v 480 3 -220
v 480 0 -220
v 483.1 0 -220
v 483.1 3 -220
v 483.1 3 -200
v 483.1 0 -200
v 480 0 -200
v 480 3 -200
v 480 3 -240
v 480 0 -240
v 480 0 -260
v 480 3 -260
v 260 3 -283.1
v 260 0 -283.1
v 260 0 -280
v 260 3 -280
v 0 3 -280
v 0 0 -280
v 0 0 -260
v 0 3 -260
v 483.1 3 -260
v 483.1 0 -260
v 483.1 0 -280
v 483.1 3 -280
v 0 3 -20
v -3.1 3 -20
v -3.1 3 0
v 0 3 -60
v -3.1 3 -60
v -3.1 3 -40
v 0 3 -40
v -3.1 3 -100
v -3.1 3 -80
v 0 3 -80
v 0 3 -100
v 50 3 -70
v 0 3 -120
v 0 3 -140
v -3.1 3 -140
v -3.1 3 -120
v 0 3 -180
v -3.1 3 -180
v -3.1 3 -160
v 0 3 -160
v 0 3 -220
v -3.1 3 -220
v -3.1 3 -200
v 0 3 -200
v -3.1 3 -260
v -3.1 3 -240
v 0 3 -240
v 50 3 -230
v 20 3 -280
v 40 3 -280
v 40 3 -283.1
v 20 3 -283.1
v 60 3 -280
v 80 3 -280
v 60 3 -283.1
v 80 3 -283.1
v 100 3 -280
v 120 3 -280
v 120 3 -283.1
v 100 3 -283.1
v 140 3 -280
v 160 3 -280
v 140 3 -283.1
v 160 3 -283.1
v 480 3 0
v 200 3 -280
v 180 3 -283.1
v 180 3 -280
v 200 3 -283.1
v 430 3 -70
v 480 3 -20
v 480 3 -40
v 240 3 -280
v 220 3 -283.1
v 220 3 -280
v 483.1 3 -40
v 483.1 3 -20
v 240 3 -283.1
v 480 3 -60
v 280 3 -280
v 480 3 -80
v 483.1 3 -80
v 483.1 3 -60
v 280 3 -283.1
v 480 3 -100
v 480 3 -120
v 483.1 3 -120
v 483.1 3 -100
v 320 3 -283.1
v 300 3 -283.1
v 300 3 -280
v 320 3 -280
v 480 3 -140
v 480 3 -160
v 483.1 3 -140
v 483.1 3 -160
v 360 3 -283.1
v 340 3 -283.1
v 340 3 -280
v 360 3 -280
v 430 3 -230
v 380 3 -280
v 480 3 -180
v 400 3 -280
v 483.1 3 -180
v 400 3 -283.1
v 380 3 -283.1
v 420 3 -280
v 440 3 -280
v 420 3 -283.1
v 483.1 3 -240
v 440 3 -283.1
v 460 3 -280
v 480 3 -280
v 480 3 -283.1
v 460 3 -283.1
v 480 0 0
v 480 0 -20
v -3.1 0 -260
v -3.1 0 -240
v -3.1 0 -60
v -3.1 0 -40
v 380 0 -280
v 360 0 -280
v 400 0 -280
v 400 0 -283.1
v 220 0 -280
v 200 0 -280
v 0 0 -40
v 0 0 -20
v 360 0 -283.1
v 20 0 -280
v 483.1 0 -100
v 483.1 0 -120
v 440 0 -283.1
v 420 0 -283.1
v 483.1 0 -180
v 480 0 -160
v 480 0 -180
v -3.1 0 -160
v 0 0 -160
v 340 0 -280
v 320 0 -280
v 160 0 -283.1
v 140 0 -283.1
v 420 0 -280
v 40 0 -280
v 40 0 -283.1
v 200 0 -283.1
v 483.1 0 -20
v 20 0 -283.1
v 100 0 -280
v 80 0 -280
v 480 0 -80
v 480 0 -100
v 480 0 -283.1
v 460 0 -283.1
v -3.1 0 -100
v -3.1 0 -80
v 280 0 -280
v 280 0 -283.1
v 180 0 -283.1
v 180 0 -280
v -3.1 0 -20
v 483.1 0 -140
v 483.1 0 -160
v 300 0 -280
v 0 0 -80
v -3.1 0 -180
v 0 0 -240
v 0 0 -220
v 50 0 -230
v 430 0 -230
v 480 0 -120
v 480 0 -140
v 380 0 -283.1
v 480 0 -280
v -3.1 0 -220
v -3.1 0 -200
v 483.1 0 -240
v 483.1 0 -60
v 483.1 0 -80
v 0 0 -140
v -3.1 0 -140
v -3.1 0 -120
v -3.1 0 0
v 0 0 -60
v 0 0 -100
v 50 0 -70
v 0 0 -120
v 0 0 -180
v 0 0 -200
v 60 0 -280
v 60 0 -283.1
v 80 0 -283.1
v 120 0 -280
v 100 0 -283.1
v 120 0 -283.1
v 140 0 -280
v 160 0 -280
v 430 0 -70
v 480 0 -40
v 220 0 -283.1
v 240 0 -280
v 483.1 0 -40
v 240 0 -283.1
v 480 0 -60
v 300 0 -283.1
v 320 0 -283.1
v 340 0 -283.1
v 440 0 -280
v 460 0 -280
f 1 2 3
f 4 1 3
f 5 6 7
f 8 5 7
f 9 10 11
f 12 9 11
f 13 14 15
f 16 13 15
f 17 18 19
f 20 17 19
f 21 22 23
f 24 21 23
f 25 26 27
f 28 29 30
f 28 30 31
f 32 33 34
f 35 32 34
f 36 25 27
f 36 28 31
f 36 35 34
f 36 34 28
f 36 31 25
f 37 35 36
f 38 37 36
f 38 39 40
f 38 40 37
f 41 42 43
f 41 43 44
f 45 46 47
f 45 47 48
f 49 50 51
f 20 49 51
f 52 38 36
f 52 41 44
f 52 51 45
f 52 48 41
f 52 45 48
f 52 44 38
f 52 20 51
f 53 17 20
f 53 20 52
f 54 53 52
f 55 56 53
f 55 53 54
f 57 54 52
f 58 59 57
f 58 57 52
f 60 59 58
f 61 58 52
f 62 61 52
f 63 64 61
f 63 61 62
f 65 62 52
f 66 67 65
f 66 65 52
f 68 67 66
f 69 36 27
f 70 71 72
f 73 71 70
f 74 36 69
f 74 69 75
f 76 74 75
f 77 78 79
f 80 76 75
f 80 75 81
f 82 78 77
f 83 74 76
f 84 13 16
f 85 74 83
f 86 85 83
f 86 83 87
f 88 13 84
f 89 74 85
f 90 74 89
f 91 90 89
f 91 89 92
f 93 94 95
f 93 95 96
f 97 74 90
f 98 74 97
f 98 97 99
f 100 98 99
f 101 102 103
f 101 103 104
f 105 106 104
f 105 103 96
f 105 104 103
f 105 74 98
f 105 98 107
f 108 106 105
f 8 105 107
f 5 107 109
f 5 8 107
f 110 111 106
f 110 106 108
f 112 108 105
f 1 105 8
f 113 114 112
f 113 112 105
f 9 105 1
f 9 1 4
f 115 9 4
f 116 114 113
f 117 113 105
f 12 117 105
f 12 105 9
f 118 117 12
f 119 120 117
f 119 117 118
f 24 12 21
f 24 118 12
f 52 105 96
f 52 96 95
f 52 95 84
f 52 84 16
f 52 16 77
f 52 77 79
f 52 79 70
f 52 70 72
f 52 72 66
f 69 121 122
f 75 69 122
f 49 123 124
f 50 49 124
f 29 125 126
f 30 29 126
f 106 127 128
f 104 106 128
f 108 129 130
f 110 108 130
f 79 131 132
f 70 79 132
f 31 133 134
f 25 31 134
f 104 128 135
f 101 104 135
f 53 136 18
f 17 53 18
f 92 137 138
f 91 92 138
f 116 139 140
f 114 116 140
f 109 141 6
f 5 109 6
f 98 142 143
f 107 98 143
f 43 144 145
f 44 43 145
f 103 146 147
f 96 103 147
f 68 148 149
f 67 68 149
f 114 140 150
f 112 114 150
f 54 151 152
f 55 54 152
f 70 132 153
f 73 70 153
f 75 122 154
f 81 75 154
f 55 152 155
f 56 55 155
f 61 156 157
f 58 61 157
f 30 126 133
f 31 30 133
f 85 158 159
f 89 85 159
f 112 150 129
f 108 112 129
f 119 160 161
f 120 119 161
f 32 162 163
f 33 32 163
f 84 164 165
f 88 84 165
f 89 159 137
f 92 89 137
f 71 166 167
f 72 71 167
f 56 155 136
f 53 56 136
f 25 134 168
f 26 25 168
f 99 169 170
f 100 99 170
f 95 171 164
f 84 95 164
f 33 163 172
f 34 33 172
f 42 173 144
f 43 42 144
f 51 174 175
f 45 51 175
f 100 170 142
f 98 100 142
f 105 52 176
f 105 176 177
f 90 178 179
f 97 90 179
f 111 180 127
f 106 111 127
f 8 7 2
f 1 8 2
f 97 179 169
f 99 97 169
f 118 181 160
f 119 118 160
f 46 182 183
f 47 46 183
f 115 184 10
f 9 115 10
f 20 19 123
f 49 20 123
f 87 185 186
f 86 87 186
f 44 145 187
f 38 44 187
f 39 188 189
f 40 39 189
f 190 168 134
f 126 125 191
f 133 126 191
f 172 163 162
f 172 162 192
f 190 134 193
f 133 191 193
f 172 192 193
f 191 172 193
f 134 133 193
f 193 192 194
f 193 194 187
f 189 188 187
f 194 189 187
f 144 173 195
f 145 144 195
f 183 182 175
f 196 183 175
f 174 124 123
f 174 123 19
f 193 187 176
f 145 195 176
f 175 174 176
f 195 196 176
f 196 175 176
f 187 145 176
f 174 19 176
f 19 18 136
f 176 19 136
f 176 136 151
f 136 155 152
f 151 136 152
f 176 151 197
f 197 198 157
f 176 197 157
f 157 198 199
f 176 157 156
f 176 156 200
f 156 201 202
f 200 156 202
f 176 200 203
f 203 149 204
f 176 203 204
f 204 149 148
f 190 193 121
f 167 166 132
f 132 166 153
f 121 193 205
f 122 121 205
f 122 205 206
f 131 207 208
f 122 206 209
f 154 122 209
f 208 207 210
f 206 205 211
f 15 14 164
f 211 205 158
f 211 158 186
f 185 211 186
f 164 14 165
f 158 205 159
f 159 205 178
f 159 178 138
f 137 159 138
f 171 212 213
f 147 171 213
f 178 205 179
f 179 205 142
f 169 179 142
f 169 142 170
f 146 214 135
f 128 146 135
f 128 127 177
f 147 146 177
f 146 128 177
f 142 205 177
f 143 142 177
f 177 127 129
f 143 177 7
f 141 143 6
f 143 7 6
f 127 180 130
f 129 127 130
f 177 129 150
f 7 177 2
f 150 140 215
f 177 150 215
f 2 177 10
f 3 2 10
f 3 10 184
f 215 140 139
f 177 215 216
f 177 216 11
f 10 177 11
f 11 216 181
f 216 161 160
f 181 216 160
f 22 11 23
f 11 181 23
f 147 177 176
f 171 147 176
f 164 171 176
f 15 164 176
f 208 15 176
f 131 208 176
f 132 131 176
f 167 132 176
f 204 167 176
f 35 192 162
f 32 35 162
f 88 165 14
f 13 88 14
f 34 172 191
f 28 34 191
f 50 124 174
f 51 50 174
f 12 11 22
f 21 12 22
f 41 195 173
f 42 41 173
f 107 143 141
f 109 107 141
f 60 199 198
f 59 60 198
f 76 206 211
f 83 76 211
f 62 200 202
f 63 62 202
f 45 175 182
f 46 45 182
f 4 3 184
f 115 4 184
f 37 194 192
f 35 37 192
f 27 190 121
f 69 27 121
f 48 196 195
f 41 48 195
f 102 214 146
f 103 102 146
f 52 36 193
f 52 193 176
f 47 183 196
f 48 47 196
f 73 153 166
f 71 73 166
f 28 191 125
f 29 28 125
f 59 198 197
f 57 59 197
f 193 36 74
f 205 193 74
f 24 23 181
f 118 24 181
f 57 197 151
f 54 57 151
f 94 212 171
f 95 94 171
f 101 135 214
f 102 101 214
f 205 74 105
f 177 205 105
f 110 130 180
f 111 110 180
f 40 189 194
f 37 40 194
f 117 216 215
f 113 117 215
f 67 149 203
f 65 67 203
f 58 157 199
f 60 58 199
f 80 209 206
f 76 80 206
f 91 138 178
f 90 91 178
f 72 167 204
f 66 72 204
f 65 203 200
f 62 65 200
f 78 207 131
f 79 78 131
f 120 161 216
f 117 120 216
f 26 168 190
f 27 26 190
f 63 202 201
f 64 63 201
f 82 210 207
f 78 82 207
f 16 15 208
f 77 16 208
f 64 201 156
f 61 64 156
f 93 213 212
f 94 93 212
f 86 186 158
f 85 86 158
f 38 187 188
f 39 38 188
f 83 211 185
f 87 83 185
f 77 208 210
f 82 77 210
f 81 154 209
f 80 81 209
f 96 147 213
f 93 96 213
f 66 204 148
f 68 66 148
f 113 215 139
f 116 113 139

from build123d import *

# Parameters (mm, degrees)
SALIENTE_EXTRUIR1_DEPTH = 3
CROQUIS2_W              = 380
CROQUIS2_H              = 160
CORTAR_EXTRUIR1_DEPTH   = 3


with BuildPart() as part:
    # Croquis1 → Saliente-Extruir1 (new body)
    with BuildSketch(Plane(origin=(0, 0, 0), x_dir=(1, 0, 0), z_dir=(0, 1, 0))):
        Polygon((480, 280), (480, 283.1), (460, 283.1), (460, 280), (440, 280), (440, 283.1), (420, 283.1), (420, 280), (400, 280), (400, 283.1), (380, 283.1), (380, 280), (360, 280), (360, 283.1), (340, 283.1), (340, 280), (320, 280), (320, 283.1), (300, 283.1), (300, 280), (280, 280), (280, 283.1), (260, 283.1), (260, 280), (240, 280), (240, 283.1), (220, 283.1), (220, 280), (200, 280), (200, 283.1), (180, 283.1), (180, 280), (160, 280), (160, 283.1), (140, 283.1), (140, 280), (120, 280), (120, 283.1), (100, 283.1), (100, 280), (80, 280), (80, 283.1), (60, 283.1), (60, 280), (40, 280), (40, 283.1), (20, 283.1), (20, 280), (0, 280), (0, 260), (-3.1, 260), (-3.1, 240), (0, 240), (0, 220), (-3.1, 220), (-3.1, 200), (0, 200), (0, 180), (-3.1, 180), (-3.1, 160), (0, 160), (0, 140), (-3.1, 140), (-3.1, 120), (0, 120), (0, 100), (-3.1, 100), (-3.1, 80), (0, 80), (0, 60), (-3.1, 60), (-3.1, 40), (0, 40), (0, 20), (-3.1, 20), (-3.1, 0), (0, 0), (480, 0), (480, 20), (483.1, 20), (483.1, 40), (480, 40), (480, 60), (483.1, 60), (483.1, 80), (480, 80), (480, 100), (483.1, 100), (483.1, 120), (480, 120), (480, 140), (483.1, 140), (483.1, 160), (480, 160), (480, 180), (483.1, 180), (483.1, 200), (480, 200), (480, 220), (483.1, 220), (483.1, 240), (480, 240), (480, 260), (483.1, 260), (483.1, 280), align=None)
    extrude(amount=SALIENTE_EXTRUIR1_DEPTH)

    # Croquis2 → Cortar-Extruir1 (cut)
    with BuildSketch(Plane(origin=(0, 3, 0), x_dir=(1, 0, 0), z_dir=(0, 1, 0))):
        with Locations((240, 150)):
            Rectangle(CROQUIS2_W, CROQUIS2_H)
    extrude(amount=-CORTAR_EXTRUIR1_DEPTH, mode=Mode.SUBTRACT)


solid = part.part
